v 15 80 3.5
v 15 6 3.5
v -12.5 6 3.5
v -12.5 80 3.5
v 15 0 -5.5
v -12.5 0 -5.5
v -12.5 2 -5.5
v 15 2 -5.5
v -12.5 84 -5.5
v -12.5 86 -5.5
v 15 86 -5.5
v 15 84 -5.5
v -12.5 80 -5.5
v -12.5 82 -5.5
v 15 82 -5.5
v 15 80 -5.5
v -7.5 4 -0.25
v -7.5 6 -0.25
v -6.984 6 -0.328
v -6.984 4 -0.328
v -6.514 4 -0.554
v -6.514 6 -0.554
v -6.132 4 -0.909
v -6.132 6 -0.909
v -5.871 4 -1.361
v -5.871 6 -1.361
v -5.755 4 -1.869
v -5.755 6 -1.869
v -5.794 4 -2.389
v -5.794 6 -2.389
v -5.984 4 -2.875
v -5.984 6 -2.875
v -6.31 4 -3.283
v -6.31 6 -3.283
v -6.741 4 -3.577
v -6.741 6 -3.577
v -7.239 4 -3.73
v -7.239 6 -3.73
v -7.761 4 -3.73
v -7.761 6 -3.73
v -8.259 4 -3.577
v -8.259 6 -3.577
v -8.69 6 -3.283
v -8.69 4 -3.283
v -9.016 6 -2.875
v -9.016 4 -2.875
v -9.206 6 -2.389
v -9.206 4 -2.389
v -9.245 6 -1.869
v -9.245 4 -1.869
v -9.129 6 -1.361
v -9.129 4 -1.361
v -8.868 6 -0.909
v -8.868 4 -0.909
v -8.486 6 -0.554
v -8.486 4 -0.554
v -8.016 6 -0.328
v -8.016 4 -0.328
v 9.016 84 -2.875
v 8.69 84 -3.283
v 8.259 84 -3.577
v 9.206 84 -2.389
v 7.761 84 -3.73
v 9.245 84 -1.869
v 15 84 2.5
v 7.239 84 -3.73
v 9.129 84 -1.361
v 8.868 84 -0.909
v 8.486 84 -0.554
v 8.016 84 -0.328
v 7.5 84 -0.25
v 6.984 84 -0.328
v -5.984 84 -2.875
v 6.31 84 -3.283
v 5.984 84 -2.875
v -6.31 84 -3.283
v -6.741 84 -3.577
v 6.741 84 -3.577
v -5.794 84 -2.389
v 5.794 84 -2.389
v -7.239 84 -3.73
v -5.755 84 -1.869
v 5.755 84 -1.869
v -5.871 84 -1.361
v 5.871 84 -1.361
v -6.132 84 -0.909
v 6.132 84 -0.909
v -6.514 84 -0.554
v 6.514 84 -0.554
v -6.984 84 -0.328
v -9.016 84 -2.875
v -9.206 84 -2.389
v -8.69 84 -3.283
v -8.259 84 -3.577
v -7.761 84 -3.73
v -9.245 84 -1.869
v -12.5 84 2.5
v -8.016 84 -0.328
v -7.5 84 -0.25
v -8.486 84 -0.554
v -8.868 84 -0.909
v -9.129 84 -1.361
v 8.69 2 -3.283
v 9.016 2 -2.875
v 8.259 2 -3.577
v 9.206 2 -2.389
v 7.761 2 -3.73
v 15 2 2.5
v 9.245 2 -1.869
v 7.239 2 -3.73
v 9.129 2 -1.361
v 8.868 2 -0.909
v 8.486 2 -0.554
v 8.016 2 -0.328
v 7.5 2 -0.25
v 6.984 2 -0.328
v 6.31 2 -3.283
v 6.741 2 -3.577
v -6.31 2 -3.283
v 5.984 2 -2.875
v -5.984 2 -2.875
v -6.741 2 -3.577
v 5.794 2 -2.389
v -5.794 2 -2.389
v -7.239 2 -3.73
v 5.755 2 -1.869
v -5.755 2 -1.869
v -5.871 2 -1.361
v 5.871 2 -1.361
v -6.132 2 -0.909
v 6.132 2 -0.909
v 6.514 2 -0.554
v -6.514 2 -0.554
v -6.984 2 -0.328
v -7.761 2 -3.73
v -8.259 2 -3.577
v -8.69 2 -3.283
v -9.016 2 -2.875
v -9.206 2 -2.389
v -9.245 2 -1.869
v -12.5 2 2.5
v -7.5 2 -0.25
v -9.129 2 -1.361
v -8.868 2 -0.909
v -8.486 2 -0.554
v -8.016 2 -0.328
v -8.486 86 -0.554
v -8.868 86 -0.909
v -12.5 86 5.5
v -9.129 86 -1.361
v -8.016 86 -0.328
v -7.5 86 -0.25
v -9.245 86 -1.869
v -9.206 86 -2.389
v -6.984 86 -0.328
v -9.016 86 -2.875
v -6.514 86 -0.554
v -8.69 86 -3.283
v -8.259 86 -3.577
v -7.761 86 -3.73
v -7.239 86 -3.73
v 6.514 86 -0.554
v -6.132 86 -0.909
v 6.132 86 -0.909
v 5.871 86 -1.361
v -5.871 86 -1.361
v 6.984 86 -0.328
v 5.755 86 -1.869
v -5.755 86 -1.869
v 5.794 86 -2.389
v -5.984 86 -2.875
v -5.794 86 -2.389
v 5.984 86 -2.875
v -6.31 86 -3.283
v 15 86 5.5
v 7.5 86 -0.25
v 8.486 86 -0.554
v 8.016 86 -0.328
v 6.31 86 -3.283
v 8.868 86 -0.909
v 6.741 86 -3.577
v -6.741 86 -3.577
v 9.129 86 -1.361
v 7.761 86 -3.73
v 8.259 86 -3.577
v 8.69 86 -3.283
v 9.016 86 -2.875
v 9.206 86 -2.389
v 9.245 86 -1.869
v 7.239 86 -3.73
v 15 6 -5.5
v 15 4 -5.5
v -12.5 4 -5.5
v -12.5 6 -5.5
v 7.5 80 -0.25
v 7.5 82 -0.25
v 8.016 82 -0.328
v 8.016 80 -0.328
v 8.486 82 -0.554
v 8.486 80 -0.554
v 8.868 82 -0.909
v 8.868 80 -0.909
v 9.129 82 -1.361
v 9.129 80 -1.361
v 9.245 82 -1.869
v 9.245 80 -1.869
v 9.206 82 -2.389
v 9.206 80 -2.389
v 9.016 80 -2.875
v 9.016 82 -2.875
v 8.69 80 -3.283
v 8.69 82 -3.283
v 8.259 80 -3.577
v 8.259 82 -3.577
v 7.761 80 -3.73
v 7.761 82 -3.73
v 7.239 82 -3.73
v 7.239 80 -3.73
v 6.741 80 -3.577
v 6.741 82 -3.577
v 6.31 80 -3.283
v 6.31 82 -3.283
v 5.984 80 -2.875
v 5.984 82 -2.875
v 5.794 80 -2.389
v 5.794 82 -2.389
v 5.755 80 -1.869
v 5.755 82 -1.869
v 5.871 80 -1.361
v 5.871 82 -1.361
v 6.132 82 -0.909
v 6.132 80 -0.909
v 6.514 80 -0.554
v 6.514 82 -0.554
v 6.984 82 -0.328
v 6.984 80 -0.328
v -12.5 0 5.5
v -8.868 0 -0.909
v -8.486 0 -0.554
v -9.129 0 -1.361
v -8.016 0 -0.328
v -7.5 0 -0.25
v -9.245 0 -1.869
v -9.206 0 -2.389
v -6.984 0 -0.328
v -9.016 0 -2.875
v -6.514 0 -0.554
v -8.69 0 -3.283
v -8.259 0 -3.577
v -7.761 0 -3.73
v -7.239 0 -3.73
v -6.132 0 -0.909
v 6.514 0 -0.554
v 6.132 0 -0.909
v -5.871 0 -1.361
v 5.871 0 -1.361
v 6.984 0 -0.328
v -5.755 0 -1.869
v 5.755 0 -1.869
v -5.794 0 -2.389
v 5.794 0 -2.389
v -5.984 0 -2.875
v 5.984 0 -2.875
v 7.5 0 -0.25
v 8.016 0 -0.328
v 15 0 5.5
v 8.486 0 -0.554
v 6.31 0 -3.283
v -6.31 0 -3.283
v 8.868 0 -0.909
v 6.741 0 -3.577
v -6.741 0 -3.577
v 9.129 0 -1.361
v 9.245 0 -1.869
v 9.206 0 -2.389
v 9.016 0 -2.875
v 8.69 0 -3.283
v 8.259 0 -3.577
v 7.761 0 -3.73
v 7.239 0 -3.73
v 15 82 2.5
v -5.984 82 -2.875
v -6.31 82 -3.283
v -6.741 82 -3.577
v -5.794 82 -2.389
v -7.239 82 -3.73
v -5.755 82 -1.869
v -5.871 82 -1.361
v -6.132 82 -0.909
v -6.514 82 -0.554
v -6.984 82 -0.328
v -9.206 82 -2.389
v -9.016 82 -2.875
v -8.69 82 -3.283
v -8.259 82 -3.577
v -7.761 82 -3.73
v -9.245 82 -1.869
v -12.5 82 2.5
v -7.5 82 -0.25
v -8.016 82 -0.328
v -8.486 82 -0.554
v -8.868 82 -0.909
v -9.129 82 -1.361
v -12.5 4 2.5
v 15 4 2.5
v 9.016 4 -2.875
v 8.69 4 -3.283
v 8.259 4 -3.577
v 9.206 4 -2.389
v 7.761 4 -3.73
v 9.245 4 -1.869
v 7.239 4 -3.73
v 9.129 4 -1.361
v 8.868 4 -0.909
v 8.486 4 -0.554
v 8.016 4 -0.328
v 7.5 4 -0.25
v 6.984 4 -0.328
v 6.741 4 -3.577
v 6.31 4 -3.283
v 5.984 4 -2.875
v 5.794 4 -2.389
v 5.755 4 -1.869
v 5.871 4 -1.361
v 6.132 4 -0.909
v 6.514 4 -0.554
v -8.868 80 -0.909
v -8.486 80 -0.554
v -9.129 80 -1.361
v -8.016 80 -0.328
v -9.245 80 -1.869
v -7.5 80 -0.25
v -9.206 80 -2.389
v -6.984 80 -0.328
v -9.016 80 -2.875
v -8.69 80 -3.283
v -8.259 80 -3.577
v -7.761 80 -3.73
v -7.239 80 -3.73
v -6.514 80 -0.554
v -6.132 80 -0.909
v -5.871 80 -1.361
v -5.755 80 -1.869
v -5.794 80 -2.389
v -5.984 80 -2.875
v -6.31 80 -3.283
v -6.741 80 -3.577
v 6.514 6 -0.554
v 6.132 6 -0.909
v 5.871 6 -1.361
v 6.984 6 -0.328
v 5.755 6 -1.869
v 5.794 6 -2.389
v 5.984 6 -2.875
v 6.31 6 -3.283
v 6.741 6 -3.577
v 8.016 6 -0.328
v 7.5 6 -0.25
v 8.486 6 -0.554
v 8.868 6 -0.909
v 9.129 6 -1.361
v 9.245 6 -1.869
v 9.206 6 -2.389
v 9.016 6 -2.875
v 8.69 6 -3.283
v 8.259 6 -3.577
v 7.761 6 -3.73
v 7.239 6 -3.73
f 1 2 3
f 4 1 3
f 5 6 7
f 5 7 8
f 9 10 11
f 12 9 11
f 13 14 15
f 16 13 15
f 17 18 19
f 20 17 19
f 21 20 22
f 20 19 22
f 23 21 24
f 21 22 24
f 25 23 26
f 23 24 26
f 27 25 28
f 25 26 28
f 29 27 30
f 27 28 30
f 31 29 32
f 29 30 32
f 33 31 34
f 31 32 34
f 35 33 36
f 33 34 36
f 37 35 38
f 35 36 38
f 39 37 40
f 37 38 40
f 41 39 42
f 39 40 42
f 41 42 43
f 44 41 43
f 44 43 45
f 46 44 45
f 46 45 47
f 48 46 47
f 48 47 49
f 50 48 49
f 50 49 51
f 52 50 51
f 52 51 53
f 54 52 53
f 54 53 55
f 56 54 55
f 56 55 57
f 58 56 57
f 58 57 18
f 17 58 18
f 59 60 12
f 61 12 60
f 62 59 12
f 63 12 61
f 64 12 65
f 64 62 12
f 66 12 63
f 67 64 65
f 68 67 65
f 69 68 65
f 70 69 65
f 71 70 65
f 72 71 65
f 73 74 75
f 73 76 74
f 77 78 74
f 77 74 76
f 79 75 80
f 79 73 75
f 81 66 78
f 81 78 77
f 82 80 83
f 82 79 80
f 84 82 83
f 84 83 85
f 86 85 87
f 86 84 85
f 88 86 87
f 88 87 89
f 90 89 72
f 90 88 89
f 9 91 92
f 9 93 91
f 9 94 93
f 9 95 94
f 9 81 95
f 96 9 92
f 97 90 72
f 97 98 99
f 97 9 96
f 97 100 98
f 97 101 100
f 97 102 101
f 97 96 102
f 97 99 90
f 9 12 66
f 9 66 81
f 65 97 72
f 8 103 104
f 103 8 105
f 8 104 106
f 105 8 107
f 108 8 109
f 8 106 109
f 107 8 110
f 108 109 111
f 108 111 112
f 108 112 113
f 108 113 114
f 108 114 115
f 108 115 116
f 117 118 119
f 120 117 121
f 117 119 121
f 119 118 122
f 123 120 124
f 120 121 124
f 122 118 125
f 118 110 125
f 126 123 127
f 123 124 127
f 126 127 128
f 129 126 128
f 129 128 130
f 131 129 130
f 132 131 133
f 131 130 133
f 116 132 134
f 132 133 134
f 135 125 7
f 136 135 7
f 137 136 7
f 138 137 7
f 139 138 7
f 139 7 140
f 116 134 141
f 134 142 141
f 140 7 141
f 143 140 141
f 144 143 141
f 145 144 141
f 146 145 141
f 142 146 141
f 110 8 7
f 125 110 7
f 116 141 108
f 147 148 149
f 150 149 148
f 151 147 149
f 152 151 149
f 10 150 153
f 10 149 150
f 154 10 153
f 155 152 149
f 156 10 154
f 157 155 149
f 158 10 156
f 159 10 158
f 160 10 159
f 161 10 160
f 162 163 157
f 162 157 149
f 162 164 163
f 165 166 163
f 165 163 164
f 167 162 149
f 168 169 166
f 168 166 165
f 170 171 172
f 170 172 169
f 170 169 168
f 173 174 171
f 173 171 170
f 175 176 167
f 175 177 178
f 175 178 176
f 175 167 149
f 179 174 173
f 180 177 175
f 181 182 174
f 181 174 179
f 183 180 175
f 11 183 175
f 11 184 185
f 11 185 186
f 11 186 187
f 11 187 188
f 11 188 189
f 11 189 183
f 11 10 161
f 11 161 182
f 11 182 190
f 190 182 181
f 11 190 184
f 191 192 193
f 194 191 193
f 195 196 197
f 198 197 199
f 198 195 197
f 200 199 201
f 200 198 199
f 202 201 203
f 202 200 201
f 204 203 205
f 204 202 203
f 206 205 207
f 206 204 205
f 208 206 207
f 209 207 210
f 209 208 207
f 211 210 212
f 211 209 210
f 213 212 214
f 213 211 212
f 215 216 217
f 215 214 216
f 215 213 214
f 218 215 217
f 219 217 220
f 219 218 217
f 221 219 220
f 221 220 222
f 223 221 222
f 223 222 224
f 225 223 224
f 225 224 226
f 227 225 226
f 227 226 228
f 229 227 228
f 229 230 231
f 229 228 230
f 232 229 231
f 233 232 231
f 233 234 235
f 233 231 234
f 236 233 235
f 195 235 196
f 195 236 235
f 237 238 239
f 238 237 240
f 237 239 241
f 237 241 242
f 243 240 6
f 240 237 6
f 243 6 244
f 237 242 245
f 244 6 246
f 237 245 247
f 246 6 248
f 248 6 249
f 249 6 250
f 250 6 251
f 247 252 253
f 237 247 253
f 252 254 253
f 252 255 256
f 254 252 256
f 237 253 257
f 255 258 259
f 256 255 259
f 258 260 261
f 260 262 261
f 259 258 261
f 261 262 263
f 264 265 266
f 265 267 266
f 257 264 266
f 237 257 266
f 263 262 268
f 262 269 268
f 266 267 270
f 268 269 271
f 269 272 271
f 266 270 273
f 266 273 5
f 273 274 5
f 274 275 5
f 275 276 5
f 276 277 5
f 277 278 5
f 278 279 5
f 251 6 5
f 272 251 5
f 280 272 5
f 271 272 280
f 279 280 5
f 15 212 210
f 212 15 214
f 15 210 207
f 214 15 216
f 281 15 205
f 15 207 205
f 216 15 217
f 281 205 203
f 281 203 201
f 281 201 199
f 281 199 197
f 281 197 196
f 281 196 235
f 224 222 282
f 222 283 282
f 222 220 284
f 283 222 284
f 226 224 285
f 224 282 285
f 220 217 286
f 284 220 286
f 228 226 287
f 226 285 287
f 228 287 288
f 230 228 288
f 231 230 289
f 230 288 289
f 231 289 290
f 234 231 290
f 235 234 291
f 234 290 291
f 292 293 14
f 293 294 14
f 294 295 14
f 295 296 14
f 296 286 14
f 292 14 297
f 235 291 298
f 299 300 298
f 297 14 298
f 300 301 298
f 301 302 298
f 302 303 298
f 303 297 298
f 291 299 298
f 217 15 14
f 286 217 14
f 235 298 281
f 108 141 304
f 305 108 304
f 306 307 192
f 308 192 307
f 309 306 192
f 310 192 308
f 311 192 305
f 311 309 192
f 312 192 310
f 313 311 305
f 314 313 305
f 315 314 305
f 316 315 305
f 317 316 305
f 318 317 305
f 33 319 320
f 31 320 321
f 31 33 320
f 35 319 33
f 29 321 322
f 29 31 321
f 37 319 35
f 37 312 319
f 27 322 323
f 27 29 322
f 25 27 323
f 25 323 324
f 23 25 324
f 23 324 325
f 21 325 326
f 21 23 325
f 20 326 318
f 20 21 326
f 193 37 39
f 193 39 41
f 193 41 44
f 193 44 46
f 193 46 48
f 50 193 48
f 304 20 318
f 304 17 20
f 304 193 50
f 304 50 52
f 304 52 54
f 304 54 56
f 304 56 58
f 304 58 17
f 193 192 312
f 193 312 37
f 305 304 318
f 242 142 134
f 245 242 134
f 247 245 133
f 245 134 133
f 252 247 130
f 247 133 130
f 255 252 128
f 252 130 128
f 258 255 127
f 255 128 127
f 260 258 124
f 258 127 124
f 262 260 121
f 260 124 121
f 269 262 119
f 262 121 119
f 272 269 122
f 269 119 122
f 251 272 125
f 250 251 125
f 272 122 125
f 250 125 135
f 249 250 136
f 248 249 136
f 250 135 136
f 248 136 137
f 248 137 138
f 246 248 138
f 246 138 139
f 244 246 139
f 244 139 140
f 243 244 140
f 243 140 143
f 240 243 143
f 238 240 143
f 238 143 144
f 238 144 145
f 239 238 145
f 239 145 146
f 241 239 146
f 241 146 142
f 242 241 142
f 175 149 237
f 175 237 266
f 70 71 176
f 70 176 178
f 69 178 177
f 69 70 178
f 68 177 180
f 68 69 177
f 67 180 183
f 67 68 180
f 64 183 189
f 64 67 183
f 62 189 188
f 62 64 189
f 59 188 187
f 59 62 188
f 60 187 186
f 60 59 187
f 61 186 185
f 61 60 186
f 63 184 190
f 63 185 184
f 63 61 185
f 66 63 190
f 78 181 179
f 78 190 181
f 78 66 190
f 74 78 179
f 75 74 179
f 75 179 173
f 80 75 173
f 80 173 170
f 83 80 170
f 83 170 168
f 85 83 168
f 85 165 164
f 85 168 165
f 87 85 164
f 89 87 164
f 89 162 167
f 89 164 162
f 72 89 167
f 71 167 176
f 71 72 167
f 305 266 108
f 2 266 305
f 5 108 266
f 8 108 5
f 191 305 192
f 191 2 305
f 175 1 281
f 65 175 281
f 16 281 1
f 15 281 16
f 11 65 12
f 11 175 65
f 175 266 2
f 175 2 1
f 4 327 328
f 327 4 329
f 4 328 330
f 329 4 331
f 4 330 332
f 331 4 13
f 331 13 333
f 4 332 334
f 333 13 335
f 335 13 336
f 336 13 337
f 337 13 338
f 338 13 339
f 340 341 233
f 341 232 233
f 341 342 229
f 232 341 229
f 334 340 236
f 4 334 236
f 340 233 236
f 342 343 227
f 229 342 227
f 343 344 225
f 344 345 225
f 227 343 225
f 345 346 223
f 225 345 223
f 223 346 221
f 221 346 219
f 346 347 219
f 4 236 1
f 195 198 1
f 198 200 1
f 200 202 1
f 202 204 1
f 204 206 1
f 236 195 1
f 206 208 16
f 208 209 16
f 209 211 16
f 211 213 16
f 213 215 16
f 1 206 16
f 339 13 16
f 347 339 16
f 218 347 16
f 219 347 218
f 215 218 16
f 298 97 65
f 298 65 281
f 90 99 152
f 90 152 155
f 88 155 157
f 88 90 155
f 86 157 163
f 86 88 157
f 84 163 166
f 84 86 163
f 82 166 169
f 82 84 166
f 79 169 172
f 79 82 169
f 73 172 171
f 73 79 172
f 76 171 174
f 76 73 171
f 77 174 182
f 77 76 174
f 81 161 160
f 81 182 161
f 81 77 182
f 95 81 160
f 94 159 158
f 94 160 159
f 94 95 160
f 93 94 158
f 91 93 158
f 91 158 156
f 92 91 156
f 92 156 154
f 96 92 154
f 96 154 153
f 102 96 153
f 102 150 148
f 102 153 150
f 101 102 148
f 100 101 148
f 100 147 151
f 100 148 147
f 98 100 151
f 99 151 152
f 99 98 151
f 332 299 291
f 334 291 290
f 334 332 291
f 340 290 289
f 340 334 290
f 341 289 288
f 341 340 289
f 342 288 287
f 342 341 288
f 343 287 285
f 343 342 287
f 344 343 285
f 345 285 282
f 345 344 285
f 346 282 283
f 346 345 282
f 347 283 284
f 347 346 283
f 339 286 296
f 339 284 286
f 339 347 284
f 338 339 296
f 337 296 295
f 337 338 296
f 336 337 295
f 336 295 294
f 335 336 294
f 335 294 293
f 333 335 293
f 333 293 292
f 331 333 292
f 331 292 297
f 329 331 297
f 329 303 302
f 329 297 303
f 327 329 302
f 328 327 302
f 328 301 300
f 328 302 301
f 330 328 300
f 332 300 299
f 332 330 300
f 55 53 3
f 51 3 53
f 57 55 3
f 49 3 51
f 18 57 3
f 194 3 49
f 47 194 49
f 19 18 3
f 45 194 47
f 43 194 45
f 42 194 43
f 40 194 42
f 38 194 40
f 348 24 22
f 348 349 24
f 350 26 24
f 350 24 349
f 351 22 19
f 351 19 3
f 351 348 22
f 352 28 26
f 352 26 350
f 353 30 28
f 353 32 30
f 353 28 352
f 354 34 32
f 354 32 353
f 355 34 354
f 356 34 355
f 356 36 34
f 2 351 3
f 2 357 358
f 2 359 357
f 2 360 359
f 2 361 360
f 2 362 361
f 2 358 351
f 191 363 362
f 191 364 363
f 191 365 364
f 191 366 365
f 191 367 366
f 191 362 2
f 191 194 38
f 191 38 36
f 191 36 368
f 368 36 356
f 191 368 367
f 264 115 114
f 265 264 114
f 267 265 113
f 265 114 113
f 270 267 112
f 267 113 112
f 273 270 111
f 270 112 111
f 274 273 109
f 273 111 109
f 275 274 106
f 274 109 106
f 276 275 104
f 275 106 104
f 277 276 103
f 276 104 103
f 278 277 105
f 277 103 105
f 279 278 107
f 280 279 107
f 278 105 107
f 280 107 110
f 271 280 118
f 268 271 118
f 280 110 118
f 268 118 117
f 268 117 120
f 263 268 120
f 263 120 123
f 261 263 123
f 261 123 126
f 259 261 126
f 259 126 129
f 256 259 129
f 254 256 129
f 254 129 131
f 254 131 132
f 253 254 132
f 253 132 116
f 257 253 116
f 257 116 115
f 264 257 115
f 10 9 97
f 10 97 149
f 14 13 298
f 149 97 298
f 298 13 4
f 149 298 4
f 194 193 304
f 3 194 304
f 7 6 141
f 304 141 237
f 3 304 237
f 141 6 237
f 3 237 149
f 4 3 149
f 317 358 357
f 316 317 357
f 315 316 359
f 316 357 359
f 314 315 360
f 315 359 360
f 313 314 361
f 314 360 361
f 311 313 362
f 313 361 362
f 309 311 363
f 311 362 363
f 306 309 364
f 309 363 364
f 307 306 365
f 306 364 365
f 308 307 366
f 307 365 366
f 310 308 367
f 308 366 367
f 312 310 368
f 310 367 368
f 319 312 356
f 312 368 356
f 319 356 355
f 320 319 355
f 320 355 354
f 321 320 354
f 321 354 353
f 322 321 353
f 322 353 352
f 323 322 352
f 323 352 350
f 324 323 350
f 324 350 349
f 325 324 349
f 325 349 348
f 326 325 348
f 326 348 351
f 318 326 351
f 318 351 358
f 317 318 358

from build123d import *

# Parameters (mm, degrees)
SKETCH_1_W          = 30
SKETCH_1_H          = 11
EXTRUDE_1_DEPTH     = 6
SKETCH_2_W          = 16
SKETCH_2_H          = 2
CUT_EXTRUDE_1_DEPTH = 144
EXTRUDE_2_DEPTH     = 74
SKETCH_4_R          = 1.75
CUT_EXTRUDE_2_DEPTH = 144
SKETCH_5_W          = 11
SKETCH_5_H          = 80
CUT_EXTRUDE_3_DEPTH = 2.5
SKETCH_7_W          = 4
SKETCH_7_H          = 9
CUT_EXTRUDE_4_DEPTH = 74


with BuildPart() as part:
    # 草图1 → 凸台-拉伸1 (new body)
    with BuildSketch(Plane(origin=(0, 0, 0), x_dir=(1, 0, 0), z_dir=(0, 1, 0))):
        Rectangle(SKETCH_1_W, SKETCH_1_H)
    extrude_1 = extrude(amount=EXTRUDE_1_DEPTH)

    # 草图2 → 切除-拉伸1 (cut)
    with BuildSketch(Plane.ZY.offset(15)):
        with Locations((-5.5, 3)):
            Rectangle(SKETCH_2_W, SKETCH_2_H)
    cut_extrude_1 = extrude(amount=-CUT_EXTRUDE_1_DEPTH, mode=Mode.SUBTRACT)

    # 草图3 → 凸台-拉伸2 (add)
    with BuildSketch(Plane(origin=(0, 6, 0), x_dir=(1, 0, 0), z_dir=(0, 1, 0))):
        Polygon((2, 5.5), (-2, 5.5), (-2, -3.5), (-15, -3.5), (-15, -5.5), (15, -5.5), (15, -3.5), (2, -3.5), align=None)
    extrude(amount=EXTRUDE_2_DEPTH)

    # 草图4 → 切除-拉伸2 (cut)
    with BuildSketch(Plane(origin=(0, 6, 0), x_dir=(1, 0, 0), z_dir=(0, 1, 0))):
        with Locations(Location((-7.5, 2, 0), (0, 0, 270))):
            Circle(SKETCH_4_R)
        with Locations(Location((7.5, 2, 0), (0, 0, 270))):
            Circle(SKETCH_4_R)
    cut_extrude_2 = extrude(amount=-CUT_EXTRUDE_2_DEPTH, mode=Mode.SUBTRACT)

    # 草图5 → 切除-拉伸3 (cut)
    with BuildSketch(Plane.ZY.offset(15)):
        with Locations((0, 40)):
            Rectangle(SKETCH_5_W, SKETCH_5_H)
    cut_extrude_3 = extrude(amount=-CUT_EXTRUDE_3_DEPTH, mode=Mode.SUBTRACT)

    # 草图7 → 切除-拉伸4 (cut)
    with BuildSketch(Plane(origin=(0, 80, 0), x_dir=(1, 0, 0), z_dir=(0, 1, 0))):
        with Locations((0, 1)):
            Rectangle(SKETCH_7_W, SKETCH_7_H)
    extrude(amount=-CUT_EXTRUDE_4_DEPTH, mode=Mode.SUBTRACT)

    # 镜向1: 凸台-拉伸1, 切除-拉伸1, 切除-拉伸2, 切除-拉伸3 across plane
    add(extrude_1.mirror(Plane.ZX.offset(43)))
    add(cut_extrude_1.mirror(Plane.ZX.offset(43)), mode=Mode.SUBTRACT)
    add(cut_extrude_2.mirror(Plane.ZX.offset(43)), mode=Mode.SUBTRACT)
    add(cut_extrude_3.mirror(Plane.ZX.offset(43)), mode=Mode.SUBTRACT)


solid = part.part
